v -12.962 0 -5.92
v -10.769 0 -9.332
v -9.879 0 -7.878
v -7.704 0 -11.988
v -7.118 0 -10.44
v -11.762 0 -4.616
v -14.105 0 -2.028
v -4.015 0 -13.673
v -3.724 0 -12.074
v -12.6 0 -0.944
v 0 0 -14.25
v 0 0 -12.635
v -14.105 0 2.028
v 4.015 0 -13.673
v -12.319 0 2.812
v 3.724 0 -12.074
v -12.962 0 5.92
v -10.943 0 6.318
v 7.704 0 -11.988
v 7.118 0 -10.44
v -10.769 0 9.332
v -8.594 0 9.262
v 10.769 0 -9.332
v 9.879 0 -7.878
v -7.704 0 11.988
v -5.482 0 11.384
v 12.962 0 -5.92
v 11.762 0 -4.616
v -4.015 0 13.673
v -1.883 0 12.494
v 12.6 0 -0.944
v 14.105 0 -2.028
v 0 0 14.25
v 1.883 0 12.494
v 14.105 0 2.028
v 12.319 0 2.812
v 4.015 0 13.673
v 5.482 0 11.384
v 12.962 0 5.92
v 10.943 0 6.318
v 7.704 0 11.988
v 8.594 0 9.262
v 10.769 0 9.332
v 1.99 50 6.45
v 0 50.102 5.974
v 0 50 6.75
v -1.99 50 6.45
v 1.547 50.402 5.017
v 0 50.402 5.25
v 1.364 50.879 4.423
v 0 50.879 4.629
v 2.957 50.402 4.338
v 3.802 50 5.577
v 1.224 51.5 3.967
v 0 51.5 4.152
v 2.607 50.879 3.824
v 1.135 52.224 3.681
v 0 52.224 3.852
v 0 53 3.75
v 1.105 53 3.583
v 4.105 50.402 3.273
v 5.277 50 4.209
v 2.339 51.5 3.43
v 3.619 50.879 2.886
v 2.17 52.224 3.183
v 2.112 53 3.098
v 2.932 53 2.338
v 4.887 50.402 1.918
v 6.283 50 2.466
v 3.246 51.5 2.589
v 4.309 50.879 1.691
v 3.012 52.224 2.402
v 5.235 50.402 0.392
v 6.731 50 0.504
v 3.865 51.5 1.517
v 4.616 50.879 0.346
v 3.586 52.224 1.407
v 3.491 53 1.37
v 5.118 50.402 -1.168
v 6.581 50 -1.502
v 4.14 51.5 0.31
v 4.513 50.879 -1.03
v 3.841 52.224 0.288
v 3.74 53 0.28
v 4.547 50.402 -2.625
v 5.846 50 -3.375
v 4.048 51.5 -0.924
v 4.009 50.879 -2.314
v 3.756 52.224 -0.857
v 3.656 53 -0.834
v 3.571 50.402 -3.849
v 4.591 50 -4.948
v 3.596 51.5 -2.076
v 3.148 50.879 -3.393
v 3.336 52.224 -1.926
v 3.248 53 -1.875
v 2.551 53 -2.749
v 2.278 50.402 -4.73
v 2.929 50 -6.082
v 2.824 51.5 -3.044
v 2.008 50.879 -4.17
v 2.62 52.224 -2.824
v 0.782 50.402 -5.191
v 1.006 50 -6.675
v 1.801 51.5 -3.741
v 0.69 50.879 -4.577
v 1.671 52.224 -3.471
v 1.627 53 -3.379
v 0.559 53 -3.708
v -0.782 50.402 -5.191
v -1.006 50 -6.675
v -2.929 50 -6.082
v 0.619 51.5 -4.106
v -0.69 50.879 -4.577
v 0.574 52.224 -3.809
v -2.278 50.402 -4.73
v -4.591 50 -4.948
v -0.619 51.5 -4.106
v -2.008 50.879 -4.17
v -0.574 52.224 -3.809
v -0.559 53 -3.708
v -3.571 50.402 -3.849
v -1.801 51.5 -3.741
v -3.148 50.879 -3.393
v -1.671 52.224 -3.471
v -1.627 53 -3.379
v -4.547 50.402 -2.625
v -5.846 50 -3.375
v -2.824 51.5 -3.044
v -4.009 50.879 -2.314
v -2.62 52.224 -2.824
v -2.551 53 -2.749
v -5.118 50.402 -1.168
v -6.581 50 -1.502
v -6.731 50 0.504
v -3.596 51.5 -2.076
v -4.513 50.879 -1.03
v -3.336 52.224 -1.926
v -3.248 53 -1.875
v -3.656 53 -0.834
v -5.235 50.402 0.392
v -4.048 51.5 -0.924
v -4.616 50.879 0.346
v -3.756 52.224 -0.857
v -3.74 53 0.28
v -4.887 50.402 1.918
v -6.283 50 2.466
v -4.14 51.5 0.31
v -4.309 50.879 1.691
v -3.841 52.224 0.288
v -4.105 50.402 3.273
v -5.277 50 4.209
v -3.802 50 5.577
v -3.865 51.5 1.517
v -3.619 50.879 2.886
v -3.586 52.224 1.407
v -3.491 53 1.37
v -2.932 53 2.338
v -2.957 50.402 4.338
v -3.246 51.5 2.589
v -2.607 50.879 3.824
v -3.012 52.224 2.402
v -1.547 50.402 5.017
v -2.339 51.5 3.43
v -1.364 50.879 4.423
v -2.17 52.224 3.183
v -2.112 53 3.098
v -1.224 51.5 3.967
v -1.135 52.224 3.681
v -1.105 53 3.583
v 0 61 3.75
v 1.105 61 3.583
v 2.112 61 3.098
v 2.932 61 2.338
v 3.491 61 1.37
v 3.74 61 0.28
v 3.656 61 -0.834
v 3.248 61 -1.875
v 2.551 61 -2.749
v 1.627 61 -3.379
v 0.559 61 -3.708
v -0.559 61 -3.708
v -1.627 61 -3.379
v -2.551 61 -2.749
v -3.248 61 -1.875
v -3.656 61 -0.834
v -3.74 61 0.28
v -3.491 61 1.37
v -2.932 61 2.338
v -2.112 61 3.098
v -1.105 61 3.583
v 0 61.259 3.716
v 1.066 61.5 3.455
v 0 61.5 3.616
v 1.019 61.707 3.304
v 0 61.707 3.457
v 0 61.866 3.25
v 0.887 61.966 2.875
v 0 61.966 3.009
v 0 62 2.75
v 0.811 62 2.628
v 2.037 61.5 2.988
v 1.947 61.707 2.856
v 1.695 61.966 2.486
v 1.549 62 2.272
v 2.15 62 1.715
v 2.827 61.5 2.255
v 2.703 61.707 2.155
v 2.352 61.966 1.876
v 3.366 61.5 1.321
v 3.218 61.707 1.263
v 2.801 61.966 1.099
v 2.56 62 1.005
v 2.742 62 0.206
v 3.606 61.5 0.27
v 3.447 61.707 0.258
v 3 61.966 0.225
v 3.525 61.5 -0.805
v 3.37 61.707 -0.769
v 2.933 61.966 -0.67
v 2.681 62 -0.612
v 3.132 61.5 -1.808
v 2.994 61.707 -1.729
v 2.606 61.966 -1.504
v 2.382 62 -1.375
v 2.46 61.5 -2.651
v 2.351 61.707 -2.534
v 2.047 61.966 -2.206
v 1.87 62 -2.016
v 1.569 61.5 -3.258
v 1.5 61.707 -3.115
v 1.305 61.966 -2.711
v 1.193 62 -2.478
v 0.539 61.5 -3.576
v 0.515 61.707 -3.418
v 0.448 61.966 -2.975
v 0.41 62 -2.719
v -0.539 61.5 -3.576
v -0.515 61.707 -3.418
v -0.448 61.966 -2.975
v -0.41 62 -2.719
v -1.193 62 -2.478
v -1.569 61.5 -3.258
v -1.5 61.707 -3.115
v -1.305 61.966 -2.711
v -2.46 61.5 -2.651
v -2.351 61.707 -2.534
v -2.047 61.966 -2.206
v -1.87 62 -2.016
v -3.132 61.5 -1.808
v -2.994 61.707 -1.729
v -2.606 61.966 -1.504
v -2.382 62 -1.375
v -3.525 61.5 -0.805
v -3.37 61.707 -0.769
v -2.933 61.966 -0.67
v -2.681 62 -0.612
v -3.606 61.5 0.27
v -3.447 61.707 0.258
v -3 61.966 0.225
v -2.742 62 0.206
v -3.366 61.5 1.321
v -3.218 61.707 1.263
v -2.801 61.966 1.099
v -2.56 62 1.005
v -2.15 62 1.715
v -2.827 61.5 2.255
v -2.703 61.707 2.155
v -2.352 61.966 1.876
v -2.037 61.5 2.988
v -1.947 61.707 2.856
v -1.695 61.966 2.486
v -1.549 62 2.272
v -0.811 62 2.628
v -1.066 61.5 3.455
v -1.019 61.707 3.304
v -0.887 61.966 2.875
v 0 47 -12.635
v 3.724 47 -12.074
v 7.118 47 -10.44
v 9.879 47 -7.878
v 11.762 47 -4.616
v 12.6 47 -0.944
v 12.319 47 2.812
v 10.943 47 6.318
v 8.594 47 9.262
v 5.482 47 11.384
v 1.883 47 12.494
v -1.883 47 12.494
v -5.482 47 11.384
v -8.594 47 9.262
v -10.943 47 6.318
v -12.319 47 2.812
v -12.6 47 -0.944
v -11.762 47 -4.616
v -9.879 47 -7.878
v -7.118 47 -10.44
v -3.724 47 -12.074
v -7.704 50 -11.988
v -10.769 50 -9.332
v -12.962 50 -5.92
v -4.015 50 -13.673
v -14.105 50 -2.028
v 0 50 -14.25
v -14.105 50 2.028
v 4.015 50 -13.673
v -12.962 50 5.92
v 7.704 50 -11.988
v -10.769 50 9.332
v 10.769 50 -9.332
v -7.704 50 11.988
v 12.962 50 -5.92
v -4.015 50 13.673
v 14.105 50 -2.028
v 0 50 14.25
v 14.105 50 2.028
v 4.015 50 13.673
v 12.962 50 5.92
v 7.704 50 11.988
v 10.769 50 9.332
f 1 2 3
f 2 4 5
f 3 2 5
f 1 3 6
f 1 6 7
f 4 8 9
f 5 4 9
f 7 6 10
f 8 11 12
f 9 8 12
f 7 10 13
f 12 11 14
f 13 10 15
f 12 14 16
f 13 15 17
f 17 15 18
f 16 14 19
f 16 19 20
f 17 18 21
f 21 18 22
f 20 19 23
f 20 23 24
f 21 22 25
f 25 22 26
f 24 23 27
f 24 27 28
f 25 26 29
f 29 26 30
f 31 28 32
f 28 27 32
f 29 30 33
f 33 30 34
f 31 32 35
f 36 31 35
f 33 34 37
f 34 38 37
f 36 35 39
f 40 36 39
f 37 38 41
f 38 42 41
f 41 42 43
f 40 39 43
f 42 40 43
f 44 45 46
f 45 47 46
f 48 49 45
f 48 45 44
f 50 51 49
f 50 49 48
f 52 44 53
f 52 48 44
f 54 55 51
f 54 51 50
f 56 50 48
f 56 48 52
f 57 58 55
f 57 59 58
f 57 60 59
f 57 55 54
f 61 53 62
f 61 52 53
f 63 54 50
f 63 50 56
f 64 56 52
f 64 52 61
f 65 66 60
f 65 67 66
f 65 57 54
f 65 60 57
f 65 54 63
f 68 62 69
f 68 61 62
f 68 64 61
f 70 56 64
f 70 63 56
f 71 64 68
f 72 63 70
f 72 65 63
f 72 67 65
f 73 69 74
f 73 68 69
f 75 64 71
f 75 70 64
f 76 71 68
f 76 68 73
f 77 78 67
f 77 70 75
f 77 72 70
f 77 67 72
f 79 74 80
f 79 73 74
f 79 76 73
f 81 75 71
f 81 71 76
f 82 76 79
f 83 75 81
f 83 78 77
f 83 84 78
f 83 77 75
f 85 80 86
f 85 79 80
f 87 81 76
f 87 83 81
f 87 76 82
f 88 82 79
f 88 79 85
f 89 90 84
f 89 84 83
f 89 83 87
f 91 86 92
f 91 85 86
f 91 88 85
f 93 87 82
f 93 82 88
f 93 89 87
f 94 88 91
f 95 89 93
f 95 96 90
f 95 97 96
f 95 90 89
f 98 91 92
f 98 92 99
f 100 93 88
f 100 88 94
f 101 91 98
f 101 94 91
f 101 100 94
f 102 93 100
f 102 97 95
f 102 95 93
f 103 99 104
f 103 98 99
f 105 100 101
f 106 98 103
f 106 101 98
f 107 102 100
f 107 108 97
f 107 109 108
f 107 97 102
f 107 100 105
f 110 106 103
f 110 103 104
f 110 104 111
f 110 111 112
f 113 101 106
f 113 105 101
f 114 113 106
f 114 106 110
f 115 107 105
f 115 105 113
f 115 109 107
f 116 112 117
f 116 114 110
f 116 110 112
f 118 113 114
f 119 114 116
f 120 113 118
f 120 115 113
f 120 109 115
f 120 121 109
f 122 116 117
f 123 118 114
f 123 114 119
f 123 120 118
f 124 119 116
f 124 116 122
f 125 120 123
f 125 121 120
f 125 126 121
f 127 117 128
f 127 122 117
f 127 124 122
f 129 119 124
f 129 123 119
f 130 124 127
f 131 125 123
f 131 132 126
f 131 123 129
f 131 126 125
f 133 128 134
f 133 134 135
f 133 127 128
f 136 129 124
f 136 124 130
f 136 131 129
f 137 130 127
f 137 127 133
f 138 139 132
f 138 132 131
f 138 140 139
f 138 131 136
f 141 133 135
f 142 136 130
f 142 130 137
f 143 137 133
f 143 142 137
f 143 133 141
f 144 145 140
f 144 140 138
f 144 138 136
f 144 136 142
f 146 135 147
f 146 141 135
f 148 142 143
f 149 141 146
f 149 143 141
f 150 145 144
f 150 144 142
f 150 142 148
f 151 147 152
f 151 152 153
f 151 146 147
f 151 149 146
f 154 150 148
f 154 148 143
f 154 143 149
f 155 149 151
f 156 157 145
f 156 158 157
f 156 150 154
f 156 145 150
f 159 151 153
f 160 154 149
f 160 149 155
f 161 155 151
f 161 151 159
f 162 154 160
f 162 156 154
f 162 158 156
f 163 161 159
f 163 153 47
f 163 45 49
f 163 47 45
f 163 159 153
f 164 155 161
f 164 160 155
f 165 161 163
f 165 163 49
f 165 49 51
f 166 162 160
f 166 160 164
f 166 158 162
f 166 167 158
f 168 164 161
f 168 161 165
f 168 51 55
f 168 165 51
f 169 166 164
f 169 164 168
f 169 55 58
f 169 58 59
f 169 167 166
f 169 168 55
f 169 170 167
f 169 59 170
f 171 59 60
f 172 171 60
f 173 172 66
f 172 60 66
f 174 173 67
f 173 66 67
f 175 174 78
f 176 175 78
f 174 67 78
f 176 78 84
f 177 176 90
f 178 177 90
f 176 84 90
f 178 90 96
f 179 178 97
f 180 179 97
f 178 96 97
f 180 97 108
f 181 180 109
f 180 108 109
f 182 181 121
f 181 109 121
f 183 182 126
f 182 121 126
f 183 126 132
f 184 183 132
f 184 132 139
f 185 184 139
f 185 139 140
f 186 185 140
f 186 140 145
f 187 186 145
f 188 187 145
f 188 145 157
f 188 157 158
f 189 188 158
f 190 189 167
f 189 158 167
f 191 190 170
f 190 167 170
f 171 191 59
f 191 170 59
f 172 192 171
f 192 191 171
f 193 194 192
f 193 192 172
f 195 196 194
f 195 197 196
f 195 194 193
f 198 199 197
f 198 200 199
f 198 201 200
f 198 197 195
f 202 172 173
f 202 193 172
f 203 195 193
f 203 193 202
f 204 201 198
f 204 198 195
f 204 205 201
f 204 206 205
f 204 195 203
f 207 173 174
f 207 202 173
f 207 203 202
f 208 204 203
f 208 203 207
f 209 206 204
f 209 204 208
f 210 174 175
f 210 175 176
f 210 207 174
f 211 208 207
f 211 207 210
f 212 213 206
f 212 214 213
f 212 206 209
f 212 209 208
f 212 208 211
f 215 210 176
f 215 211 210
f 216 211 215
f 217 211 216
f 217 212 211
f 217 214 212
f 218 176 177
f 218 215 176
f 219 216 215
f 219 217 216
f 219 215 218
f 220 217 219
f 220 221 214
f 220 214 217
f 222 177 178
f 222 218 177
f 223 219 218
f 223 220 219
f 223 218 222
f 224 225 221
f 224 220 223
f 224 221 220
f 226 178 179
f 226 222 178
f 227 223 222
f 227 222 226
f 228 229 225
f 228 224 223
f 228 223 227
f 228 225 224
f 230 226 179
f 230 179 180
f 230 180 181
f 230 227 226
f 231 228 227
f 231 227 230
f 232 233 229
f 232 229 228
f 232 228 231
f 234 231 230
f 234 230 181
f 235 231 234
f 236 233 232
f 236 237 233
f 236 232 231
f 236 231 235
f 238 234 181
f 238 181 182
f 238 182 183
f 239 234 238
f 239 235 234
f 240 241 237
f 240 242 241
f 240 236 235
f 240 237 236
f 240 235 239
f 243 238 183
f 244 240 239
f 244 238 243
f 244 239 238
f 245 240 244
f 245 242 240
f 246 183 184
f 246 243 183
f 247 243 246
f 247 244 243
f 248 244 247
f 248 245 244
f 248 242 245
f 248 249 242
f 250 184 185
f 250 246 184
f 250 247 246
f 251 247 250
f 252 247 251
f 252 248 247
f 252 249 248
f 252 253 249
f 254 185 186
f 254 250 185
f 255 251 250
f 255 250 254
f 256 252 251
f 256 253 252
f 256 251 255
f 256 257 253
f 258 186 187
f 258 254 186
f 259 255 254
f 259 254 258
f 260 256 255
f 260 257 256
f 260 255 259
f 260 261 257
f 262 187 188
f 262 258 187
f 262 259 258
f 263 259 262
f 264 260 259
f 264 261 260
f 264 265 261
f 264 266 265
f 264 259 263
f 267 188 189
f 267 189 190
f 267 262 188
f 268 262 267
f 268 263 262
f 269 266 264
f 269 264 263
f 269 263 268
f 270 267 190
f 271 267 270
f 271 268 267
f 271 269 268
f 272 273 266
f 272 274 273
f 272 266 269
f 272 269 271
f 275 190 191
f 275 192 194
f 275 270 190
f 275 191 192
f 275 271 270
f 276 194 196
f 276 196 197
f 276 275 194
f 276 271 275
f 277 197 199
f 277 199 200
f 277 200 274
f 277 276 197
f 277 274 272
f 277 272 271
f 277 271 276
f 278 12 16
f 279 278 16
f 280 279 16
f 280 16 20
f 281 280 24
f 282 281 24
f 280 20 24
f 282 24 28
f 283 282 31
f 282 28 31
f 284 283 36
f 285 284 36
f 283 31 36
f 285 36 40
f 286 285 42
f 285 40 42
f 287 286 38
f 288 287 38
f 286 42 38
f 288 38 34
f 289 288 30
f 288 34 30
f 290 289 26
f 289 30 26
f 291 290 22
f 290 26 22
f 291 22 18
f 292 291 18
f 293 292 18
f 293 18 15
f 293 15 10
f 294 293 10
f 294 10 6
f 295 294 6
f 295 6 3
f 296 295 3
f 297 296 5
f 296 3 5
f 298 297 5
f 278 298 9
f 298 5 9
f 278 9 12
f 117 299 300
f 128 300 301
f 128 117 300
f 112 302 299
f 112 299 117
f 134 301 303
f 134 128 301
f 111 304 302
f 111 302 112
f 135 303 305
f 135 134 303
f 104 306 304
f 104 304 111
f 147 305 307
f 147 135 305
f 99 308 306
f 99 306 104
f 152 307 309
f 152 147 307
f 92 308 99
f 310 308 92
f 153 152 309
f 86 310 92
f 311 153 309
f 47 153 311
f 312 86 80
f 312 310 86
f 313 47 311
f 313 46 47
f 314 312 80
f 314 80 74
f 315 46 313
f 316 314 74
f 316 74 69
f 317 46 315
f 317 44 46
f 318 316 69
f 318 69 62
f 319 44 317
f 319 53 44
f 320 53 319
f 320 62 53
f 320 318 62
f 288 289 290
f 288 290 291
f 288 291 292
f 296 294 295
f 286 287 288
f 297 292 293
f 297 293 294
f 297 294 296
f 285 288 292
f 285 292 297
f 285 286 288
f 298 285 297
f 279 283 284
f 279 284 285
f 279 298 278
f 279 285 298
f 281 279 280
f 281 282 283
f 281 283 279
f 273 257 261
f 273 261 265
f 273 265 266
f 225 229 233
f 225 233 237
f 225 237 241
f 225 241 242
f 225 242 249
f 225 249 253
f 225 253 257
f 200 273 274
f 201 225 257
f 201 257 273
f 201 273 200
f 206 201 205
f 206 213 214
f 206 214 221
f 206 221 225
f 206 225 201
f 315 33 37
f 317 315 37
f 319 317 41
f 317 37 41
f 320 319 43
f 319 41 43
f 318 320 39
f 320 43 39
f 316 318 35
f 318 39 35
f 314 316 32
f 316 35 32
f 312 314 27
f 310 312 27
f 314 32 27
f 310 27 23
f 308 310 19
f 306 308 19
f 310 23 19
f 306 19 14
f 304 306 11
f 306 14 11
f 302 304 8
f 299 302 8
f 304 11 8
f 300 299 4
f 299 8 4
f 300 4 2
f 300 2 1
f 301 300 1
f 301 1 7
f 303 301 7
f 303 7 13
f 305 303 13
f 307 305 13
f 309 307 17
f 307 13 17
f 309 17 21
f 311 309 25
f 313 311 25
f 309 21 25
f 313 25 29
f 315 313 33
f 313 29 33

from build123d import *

# Parameters (mm, degrees)
IZIM3_R                     = 14.25
Y_KSEKLIK_EKSTR_ZYON2_DEPTH = 50
IZIM4_R                     = 3.75
Y_KSEKLIK_EKSTR_ZYON3_DEPTH = 12
RADYUS1_R                   = 3
RADYUS2_R                   = 1
IZIM5_R                     = 12.635430767
KES_EKSTR_ZYON1_DEPTH       = 47


with BuildPart() as part:
    # Çizim3 → Yükseklik-Ekstrüzyon2 (new body)
    with BuildSketch(Plane(origin=(0, 0, 0), x_dir=(1, 0, 0), z_dir=(0, 1, 0))):
        with Locations(Location((0, 0, 0), (0, 0, 270))):
            Circle(IZIM3_R)
    extrude(amount=Y_KSEKLIK_EKSTR_ZYON2_DEPTH)

    # Çizim4 → Yükseklik-Ekstrüzyon3 (add)
    with BuildSketch(Plane(origin=(0, 50, 0), x_dir=(1, 0, 0), z_dir=(0, 1, 0))):
        with Locations(Location((0, 0, 0), (0, 0, 270))):
            Circle(IZIM4_R)
    extrude(amount=Y_KSEKLIK_EKSTR_ZYON3_DEPTH)

    # Radyus1
    radyus1_edges = [part.edges().sort_by_distance(p)[0] for p in [
        (0, 50, -3.75),
    ]]
    fillet(radyus1_edges, radius=RADYUS1_R)

    # Radyus2
    radyus2_edges = [part.edges().sort_by_distance(p)[0] for p in [
        (0, 62, -3.75),
    ]]
    fillet(radyus2_edges, radius=RADYUS2_R)

    # Çizim5 → Kes-Ekstrüzyon1 (cut)
    with BuildSketch(Plane.XZ):
        with Locations(Location((0, 0, 0), (0, 0, 270))):
            Circle(IZIM5_R)
    extrude(amount=-KES_EKSTR_ZYON1_DEPTH, mode=Mode.SUBTRACT)


solid = part.part
